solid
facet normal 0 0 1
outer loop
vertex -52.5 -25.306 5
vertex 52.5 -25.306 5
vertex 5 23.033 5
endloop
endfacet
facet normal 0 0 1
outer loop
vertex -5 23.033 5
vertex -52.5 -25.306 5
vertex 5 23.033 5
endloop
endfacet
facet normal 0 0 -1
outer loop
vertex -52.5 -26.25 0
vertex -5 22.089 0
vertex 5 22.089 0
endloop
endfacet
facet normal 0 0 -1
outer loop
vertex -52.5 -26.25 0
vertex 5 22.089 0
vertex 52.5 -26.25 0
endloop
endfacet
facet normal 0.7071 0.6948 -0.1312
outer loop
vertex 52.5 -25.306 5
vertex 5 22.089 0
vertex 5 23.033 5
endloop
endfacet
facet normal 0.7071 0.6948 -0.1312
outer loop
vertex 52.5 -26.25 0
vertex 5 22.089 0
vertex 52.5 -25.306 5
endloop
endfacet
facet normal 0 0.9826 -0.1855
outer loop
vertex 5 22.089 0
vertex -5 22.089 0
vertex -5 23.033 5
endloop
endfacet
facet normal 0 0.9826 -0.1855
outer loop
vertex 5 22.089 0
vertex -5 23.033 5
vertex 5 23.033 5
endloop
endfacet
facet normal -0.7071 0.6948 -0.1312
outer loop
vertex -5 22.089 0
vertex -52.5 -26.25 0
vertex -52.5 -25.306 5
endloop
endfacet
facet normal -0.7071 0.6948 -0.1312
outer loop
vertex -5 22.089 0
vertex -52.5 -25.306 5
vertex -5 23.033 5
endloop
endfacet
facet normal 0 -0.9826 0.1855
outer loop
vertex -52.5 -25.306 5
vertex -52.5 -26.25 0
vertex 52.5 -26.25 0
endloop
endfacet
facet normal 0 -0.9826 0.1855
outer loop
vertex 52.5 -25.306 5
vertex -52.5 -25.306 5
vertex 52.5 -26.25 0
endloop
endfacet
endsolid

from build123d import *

# Parameters (mm, degrees)
F0_W     = 105
F0_H     = 52.5
F1_DEPTH = 15
F3_DEPTH = 105.001
F6_DEPTH = 15.001
F8_DEPTH = 15.001
F9_ANGLE = 10.691248


with BuildPart() as f1:
    # F0 (on Top) → F1 (new body)
    with BuildSketch(Plane.XY):
        Rectangle(F0_W, F0_H)
    extrude(amount=F1_DEPTH)

    # F2 (on face) → F3 (cut, through all)
    with BuildSketch(Plane.YZ.offset(52.5)):
        Polygon((-26.25, 15), (-26.25, 5.088328), (26.25, 15), align=None)
        Polygon((26.25, 9.911672), (-26.25, 0), (26.25, 0), align=None)
    extrude(amount=-F3_DEPTH, mode=Mode.SUBTRACT)

    # F5 (on Top) → F6 (cut, through all)
    with BuildSketch(Plane.XY):
        Polygon((-52.5, 26.25), (-52.5, -26.25), (0, 26.25), align=None)
        Polygon((0, 26.25), (52.5, -26.25), (52.5, 26.25), align=None)
    extrude(amount=F6_DEPTH, mode=Mode.SUBTRACT)

    # F7 (on Top) → F8 (cut, through all)
    with BuildSketch(Plane.XY):
        Polygon((5, 21.25), (0, 26.25), (-5, 21.25), align=None)
    extrude(amount=F8_DEPTH, mode=Mode.SUBTRACT)


with BuildPart() as f1_1:
    # F9: moved
    add(f1.part.rotate(Axis((0, -26.25, 0), (-1, 0, 0)), F9_ANGLE))


solid = f1_1.part
